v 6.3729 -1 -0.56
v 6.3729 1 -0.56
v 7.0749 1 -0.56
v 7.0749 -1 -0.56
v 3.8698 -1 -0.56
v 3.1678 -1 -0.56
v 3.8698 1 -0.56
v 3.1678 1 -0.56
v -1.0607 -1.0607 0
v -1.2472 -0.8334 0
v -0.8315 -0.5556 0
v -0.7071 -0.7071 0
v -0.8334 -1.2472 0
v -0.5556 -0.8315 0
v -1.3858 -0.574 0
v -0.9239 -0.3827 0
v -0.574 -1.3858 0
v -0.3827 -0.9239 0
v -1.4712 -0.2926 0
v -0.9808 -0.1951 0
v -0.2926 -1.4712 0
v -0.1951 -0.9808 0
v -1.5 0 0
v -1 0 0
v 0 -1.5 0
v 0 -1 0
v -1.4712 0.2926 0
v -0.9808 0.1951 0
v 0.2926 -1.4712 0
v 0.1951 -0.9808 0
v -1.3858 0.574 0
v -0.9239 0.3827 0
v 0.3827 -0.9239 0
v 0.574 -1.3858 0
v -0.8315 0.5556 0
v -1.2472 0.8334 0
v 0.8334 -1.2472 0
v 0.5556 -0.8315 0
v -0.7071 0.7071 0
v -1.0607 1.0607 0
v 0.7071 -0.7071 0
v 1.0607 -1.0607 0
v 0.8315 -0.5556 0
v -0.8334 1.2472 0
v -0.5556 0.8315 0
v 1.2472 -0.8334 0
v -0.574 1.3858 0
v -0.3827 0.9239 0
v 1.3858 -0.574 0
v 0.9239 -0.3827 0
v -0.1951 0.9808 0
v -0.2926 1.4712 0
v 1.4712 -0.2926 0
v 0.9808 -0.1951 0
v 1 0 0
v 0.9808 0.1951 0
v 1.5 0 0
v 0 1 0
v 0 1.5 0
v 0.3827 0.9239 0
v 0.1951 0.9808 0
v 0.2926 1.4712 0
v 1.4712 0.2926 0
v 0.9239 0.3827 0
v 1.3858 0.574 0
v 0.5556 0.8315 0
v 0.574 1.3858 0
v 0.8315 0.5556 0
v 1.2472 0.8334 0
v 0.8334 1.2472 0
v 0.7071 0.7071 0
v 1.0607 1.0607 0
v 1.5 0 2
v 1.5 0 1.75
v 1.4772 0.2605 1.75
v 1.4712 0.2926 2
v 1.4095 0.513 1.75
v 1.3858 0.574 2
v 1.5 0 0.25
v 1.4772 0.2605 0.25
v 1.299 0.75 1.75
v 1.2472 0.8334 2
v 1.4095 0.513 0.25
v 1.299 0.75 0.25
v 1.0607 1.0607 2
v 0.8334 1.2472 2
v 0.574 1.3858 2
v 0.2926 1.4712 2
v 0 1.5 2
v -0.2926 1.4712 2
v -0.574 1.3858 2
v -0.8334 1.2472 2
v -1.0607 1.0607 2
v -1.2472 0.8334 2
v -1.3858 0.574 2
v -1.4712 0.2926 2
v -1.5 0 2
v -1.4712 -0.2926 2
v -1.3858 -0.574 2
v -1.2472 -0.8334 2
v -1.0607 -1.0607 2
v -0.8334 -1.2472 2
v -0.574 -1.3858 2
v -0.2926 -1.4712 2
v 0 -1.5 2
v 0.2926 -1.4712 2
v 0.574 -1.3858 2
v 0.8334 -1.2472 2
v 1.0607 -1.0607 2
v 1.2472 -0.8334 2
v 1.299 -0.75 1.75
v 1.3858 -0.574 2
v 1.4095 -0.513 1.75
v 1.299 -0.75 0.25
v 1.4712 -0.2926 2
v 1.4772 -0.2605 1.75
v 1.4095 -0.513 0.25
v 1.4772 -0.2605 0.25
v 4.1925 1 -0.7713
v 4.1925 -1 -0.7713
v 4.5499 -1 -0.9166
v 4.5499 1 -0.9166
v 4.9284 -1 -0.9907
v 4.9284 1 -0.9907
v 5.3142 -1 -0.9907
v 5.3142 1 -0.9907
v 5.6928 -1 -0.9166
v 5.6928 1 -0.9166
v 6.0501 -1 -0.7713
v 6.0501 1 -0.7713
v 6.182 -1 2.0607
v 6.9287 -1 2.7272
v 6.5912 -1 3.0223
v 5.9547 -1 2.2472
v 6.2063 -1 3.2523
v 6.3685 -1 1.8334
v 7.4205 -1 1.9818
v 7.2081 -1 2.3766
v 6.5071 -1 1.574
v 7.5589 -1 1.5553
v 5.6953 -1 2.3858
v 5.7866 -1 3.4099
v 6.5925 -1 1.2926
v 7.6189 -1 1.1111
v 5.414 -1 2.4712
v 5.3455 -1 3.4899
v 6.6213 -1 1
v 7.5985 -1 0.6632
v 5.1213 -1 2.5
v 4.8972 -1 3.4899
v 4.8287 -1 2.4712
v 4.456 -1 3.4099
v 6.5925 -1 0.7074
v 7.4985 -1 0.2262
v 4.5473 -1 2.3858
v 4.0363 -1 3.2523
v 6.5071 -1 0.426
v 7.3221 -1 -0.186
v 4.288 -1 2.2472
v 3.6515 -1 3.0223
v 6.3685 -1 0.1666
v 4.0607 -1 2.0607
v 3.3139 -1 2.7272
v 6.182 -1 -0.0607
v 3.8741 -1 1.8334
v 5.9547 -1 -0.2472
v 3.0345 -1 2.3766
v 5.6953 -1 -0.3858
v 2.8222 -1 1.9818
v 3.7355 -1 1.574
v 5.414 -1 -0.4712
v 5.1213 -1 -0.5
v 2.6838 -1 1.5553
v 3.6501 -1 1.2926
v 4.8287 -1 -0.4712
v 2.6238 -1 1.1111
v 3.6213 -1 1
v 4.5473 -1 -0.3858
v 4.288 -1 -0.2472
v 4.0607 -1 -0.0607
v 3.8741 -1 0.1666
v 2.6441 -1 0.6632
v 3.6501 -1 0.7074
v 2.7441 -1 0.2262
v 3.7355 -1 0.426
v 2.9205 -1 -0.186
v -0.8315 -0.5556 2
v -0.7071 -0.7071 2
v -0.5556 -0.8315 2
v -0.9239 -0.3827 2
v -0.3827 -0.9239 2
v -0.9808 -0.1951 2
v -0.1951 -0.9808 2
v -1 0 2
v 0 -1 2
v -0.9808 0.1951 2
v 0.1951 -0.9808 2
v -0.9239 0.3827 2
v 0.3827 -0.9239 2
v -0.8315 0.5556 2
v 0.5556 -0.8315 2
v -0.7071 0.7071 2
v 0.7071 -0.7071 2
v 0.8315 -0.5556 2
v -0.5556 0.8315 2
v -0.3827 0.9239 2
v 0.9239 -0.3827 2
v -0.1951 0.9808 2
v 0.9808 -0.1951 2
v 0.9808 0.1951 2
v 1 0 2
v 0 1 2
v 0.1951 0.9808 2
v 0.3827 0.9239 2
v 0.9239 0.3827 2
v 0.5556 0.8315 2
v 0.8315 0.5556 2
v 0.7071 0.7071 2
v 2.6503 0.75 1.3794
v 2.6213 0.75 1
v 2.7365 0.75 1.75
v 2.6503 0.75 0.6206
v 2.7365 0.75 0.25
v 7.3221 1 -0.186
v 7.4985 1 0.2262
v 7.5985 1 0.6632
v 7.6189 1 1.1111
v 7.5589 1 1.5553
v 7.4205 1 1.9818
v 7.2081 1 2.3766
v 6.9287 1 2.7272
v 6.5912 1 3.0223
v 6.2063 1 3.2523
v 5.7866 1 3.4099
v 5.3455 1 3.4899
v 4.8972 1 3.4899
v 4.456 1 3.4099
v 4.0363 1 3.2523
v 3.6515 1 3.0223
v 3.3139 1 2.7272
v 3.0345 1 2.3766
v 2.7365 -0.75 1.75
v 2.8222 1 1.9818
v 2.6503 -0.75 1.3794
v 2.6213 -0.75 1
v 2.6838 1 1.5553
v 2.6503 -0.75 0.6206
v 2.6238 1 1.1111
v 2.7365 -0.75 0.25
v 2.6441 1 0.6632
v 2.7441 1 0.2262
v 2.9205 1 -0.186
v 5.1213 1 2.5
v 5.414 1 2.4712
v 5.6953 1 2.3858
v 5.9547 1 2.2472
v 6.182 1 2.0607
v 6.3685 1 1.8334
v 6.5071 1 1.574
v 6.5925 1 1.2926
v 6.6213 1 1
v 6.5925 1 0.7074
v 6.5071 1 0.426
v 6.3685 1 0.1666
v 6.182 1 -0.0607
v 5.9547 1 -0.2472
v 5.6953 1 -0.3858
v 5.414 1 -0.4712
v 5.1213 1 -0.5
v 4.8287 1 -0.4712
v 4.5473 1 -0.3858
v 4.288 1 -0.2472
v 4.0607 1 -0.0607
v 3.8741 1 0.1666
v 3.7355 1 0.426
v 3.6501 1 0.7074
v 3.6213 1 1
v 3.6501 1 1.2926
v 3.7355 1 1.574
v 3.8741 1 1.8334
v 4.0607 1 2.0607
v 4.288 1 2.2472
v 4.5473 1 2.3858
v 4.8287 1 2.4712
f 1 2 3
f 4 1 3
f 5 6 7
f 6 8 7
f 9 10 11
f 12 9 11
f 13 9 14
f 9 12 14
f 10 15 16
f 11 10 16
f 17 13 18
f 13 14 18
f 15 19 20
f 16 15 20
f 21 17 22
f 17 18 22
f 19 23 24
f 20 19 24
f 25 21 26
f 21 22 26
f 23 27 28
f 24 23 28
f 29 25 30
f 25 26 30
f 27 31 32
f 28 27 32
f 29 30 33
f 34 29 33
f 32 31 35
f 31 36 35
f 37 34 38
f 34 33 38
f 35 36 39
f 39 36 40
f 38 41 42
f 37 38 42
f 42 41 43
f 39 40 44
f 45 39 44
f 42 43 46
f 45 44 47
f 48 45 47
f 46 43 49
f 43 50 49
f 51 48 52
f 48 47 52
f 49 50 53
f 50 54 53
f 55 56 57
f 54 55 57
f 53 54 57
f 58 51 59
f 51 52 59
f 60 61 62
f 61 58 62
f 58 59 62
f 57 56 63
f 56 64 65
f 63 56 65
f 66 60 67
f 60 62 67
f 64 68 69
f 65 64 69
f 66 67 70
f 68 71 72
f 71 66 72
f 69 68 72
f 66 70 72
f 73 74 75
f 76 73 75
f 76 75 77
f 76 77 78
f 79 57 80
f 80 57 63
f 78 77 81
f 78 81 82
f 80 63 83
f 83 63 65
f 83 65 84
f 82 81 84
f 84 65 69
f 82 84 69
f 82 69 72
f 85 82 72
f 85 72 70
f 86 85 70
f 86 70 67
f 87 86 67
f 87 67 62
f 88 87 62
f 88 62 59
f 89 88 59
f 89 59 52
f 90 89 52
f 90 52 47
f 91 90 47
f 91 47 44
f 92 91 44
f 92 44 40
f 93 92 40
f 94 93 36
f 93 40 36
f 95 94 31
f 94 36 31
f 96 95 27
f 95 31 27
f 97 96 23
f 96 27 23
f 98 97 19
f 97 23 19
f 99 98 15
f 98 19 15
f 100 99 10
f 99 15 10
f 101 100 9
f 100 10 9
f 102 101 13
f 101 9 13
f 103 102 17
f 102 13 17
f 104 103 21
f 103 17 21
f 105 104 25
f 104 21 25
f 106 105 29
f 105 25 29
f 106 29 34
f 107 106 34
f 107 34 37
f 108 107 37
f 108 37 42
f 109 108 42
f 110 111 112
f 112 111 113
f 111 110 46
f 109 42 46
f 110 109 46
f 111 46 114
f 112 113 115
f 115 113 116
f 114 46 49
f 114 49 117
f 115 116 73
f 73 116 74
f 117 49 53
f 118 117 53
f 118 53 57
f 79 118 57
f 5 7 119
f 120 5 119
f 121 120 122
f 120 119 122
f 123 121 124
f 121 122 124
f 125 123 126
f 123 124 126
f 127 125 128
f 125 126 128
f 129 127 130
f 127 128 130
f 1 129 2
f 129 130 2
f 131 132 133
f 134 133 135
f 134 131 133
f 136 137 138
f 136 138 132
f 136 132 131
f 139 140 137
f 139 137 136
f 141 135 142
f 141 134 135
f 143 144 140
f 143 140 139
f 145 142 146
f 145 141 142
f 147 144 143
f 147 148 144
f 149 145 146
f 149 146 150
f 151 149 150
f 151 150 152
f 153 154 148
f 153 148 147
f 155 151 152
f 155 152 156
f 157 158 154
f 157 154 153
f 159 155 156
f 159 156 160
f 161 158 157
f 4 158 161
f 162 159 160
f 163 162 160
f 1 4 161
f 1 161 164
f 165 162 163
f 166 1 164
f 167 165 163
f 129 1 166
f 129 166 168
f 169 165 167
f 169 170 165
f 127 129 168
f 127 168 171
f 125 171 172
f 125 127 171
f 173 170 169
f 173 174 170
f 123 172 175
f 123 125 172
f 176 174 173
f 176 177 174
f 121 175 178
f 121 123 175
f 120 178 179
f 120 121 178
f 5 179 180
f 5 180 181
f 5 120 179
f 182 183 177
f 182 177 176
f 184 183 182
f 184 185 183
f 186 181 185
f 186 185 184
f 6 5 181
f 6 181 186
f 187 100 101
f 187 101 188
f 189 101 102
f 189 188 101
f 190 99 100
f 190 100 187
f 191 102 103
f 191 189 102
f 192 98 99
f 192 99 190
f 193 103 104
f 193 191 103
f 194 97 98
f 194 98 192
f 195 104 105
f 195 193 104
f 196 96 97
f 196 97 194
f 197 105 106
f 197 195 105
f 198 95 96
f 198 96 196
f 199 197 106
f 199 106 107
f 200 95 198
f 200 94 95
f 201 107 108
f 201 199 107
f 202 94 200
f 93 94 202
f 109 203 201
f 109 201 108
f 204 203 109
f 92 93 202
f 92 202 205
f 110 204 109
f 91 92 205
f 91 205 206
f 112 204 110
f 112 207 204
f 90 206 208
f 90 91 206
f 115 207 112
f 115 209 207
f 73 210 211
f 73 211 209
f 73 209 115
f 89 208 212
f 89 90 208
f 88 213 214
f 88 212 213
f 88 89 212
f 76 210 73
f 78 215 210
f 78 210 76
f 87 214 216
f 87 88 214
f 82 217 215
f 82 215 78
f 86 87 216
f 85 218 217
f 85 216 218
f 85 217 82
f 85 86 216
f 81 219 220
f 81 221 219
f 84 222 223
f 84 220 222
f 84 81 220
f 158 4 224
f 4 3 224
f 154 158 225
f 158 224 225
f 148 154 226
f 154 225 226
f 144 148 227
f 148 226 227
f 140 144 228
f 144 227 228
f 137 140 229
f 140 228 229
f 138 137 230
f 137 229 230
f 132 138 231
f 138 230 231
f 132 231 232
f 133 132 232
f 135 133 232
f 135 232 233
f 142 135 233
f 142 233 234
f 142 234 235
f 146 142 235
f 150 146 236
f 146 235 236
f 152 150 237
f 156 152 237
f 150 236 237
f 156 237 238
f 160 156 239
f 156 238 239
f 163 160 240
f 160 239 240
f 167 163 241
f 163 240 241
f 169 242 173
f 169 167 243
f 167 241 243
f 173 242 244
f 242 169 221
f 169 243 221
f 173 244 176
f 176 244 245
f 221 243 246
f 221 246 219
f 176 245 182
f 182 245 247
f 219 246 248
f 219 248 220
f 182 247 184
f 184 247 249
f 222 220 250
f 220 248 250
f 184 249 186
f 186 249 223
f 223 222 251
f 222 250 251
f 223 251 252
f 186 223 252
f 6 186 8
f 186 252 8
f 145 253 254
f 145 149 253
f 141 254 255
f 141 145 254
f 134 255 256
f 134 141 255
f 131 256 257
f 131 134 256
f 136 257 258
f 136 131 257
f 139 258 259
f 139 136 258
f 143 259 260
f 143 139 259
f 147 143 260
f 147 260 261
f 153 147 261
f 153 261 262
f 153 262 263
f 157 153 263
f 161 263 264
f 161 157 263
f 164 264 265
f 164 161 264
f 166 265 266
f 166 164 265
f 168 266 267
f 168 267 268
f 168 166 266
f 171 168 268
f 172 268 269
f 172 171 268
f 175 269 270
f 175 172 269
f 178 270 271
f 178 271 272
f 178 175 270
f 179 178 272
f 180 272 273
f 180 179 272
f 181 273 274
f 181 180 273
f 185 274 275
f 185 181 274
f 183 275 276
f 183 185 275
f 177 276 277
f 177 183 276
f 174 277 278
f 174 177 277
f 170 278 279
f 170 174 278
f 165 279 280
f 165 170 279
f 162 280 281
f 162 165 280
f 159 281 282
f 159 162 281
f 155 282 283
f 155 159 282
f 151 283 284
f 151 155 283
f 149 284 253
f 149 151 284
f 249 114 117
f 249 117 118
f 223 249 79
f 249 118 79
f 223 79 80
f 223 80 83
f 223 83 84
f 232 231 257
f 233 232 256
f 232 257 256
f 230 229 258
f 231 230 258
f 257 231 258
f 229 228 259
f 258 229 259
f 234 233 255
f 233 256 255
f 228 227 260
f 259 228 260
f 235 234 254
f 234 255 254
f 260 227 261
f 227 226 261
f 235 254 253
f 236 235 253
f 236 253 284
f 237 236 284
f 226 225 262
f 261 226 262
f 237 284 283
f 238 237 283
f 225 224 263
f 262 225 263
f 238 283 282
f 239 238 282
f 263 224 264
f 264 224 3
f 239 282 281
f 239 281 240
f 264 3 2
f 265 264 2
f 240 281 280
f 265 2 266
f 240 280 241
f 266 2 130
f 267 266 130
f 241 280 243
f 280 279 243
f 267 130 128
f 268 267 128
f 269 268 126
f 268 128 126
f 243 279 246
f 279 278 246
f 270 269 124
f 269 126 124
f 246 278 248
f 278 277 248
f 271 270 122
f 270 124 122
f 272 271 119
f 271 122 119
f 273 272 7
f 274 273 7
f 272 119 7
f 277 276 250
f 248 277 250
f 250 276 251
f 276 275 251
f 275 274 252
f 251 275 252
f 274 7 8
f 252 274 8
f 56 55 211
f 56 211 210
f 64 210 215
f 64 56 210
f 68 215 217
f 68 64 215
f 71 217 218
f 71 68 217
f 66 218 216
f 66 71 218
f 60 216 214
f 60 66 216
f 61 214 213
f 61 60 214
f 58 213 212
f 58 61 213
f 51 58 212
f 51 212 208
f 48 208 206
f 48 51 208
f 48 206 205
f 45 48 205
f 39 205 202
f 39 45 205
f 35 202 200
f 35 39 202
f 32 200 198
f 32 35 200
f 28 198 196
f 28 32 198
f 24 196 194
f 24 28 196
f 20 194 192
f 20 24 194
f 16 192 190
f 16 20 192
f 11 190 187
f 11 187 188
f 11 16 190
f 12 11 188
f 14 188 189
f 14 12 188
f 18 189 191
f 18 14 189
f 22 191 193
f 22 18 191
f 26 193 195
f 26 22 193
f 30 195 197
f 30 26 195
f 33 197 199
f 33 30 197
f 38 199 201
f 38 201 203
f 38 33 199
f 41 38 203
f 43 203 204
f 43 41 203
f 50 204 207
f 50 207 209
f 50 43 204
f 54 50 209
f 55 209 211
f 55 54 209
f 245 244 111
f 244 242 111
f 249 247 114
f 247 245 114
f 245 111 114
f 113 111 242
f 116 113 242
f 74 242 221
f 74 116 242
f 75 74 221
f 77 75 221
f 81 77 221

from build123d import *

# Parameters (mm, degrees)
SKETCH_1_R      = 1.5
SKETCH_1_R_2    = 1
EXTRUDE_1_DEPTH = 2
SKETCH_6_R      = 1.5
EXTRUDE_2_DEPTH = 1
EXTRUDE_3_DEPTH = 0.75
EXTRUDE_4_REACH = 8.98
SKETCH_10_W     = 1.5
SKETCH_10_H     = 1.5


with BuildPart() as part:
    # 草图1 → 凸台-拉伸1 (new body)
    with BuildSketch(Plane.XY):
        Circle(SKETCH_1_R)
        Circle(SKETCH_1_R_2, mode=Mode.SUBTRACT)
    extrude(amount=EXTRUDE_1_DEPTH)

    # 草图8 → 凸台-拉伸3 (add, symmetric)
    with BuildSketch(Plane.XY.offset(1)):
        with BuildLine():
            Line((1.299038106, 0.75), (1.771810874, 0.75))
            Line((1.771810874, 0.75), (1.771810874, -0.75))
            Line((1.771810874, -0.75), (1.299038106, -0.75))
            ThreePointArc((1.299038106, -0.75), (1.5, 0), (1.299038106, 0.75))
        make_face()
    extrude(amount=EXTRUDE_3_DEPTH, both=True)


with BuildPart() as body_2:
    # 草图6 → 凸台-拉伸2 (new, symmetric)
    with BuildSketch(Plane(origin=(0, 0, 0), x_dir=(1, 0, 0), z_dir=(0, 1, 0))):
        with BuildLine():
            Line((6.372879371, 0.56), (7.074881195, 0.56))
            ThreePointArc((7.074881195, 0.56), (5.121320344, -3.5), (3.167759492, 0.56))
            Line((3.167759492, 0.56), (3.869761316, 0.56))
            ThreePointArc((3.869761316, 0.56), (5.121320344, 1), (6.372879371, 0.56))
        make_face()
        with Locations((5.121320344, -1)):
            Circle(SKETCH_6_R, mode=Mode.SUBTRACT)
    extrude(amount=EXTRUDE_2_DEPTH, both=True)

    # 草图10 → 凸台-拉伸4 (add, up to next)
    with BuildSketch(Plane(origin=(1.771810874, 0, 0), x_dir=(0, 0, -1), z_dir=(1, 0, 0)), mode=Mode.PRIVATE) as extrude_4_sk1:
        with Locations((-1, 0)):
            Rectangle(SKETCH_10_W, SKETCH_10_H)
    extrude_4_tool1 = extrude(extrude_4_sk1.sketch, amount=EXTRUDE_4_REACH, mode=Mode.PRIVATE) - body_2.part

    add(part.part)  # 凸台-拉伸4 merges part
    add(extrude_4_tool1.solids().sort_by_distance((1.771811, 0, 1))[0])


solid = body_2.part
